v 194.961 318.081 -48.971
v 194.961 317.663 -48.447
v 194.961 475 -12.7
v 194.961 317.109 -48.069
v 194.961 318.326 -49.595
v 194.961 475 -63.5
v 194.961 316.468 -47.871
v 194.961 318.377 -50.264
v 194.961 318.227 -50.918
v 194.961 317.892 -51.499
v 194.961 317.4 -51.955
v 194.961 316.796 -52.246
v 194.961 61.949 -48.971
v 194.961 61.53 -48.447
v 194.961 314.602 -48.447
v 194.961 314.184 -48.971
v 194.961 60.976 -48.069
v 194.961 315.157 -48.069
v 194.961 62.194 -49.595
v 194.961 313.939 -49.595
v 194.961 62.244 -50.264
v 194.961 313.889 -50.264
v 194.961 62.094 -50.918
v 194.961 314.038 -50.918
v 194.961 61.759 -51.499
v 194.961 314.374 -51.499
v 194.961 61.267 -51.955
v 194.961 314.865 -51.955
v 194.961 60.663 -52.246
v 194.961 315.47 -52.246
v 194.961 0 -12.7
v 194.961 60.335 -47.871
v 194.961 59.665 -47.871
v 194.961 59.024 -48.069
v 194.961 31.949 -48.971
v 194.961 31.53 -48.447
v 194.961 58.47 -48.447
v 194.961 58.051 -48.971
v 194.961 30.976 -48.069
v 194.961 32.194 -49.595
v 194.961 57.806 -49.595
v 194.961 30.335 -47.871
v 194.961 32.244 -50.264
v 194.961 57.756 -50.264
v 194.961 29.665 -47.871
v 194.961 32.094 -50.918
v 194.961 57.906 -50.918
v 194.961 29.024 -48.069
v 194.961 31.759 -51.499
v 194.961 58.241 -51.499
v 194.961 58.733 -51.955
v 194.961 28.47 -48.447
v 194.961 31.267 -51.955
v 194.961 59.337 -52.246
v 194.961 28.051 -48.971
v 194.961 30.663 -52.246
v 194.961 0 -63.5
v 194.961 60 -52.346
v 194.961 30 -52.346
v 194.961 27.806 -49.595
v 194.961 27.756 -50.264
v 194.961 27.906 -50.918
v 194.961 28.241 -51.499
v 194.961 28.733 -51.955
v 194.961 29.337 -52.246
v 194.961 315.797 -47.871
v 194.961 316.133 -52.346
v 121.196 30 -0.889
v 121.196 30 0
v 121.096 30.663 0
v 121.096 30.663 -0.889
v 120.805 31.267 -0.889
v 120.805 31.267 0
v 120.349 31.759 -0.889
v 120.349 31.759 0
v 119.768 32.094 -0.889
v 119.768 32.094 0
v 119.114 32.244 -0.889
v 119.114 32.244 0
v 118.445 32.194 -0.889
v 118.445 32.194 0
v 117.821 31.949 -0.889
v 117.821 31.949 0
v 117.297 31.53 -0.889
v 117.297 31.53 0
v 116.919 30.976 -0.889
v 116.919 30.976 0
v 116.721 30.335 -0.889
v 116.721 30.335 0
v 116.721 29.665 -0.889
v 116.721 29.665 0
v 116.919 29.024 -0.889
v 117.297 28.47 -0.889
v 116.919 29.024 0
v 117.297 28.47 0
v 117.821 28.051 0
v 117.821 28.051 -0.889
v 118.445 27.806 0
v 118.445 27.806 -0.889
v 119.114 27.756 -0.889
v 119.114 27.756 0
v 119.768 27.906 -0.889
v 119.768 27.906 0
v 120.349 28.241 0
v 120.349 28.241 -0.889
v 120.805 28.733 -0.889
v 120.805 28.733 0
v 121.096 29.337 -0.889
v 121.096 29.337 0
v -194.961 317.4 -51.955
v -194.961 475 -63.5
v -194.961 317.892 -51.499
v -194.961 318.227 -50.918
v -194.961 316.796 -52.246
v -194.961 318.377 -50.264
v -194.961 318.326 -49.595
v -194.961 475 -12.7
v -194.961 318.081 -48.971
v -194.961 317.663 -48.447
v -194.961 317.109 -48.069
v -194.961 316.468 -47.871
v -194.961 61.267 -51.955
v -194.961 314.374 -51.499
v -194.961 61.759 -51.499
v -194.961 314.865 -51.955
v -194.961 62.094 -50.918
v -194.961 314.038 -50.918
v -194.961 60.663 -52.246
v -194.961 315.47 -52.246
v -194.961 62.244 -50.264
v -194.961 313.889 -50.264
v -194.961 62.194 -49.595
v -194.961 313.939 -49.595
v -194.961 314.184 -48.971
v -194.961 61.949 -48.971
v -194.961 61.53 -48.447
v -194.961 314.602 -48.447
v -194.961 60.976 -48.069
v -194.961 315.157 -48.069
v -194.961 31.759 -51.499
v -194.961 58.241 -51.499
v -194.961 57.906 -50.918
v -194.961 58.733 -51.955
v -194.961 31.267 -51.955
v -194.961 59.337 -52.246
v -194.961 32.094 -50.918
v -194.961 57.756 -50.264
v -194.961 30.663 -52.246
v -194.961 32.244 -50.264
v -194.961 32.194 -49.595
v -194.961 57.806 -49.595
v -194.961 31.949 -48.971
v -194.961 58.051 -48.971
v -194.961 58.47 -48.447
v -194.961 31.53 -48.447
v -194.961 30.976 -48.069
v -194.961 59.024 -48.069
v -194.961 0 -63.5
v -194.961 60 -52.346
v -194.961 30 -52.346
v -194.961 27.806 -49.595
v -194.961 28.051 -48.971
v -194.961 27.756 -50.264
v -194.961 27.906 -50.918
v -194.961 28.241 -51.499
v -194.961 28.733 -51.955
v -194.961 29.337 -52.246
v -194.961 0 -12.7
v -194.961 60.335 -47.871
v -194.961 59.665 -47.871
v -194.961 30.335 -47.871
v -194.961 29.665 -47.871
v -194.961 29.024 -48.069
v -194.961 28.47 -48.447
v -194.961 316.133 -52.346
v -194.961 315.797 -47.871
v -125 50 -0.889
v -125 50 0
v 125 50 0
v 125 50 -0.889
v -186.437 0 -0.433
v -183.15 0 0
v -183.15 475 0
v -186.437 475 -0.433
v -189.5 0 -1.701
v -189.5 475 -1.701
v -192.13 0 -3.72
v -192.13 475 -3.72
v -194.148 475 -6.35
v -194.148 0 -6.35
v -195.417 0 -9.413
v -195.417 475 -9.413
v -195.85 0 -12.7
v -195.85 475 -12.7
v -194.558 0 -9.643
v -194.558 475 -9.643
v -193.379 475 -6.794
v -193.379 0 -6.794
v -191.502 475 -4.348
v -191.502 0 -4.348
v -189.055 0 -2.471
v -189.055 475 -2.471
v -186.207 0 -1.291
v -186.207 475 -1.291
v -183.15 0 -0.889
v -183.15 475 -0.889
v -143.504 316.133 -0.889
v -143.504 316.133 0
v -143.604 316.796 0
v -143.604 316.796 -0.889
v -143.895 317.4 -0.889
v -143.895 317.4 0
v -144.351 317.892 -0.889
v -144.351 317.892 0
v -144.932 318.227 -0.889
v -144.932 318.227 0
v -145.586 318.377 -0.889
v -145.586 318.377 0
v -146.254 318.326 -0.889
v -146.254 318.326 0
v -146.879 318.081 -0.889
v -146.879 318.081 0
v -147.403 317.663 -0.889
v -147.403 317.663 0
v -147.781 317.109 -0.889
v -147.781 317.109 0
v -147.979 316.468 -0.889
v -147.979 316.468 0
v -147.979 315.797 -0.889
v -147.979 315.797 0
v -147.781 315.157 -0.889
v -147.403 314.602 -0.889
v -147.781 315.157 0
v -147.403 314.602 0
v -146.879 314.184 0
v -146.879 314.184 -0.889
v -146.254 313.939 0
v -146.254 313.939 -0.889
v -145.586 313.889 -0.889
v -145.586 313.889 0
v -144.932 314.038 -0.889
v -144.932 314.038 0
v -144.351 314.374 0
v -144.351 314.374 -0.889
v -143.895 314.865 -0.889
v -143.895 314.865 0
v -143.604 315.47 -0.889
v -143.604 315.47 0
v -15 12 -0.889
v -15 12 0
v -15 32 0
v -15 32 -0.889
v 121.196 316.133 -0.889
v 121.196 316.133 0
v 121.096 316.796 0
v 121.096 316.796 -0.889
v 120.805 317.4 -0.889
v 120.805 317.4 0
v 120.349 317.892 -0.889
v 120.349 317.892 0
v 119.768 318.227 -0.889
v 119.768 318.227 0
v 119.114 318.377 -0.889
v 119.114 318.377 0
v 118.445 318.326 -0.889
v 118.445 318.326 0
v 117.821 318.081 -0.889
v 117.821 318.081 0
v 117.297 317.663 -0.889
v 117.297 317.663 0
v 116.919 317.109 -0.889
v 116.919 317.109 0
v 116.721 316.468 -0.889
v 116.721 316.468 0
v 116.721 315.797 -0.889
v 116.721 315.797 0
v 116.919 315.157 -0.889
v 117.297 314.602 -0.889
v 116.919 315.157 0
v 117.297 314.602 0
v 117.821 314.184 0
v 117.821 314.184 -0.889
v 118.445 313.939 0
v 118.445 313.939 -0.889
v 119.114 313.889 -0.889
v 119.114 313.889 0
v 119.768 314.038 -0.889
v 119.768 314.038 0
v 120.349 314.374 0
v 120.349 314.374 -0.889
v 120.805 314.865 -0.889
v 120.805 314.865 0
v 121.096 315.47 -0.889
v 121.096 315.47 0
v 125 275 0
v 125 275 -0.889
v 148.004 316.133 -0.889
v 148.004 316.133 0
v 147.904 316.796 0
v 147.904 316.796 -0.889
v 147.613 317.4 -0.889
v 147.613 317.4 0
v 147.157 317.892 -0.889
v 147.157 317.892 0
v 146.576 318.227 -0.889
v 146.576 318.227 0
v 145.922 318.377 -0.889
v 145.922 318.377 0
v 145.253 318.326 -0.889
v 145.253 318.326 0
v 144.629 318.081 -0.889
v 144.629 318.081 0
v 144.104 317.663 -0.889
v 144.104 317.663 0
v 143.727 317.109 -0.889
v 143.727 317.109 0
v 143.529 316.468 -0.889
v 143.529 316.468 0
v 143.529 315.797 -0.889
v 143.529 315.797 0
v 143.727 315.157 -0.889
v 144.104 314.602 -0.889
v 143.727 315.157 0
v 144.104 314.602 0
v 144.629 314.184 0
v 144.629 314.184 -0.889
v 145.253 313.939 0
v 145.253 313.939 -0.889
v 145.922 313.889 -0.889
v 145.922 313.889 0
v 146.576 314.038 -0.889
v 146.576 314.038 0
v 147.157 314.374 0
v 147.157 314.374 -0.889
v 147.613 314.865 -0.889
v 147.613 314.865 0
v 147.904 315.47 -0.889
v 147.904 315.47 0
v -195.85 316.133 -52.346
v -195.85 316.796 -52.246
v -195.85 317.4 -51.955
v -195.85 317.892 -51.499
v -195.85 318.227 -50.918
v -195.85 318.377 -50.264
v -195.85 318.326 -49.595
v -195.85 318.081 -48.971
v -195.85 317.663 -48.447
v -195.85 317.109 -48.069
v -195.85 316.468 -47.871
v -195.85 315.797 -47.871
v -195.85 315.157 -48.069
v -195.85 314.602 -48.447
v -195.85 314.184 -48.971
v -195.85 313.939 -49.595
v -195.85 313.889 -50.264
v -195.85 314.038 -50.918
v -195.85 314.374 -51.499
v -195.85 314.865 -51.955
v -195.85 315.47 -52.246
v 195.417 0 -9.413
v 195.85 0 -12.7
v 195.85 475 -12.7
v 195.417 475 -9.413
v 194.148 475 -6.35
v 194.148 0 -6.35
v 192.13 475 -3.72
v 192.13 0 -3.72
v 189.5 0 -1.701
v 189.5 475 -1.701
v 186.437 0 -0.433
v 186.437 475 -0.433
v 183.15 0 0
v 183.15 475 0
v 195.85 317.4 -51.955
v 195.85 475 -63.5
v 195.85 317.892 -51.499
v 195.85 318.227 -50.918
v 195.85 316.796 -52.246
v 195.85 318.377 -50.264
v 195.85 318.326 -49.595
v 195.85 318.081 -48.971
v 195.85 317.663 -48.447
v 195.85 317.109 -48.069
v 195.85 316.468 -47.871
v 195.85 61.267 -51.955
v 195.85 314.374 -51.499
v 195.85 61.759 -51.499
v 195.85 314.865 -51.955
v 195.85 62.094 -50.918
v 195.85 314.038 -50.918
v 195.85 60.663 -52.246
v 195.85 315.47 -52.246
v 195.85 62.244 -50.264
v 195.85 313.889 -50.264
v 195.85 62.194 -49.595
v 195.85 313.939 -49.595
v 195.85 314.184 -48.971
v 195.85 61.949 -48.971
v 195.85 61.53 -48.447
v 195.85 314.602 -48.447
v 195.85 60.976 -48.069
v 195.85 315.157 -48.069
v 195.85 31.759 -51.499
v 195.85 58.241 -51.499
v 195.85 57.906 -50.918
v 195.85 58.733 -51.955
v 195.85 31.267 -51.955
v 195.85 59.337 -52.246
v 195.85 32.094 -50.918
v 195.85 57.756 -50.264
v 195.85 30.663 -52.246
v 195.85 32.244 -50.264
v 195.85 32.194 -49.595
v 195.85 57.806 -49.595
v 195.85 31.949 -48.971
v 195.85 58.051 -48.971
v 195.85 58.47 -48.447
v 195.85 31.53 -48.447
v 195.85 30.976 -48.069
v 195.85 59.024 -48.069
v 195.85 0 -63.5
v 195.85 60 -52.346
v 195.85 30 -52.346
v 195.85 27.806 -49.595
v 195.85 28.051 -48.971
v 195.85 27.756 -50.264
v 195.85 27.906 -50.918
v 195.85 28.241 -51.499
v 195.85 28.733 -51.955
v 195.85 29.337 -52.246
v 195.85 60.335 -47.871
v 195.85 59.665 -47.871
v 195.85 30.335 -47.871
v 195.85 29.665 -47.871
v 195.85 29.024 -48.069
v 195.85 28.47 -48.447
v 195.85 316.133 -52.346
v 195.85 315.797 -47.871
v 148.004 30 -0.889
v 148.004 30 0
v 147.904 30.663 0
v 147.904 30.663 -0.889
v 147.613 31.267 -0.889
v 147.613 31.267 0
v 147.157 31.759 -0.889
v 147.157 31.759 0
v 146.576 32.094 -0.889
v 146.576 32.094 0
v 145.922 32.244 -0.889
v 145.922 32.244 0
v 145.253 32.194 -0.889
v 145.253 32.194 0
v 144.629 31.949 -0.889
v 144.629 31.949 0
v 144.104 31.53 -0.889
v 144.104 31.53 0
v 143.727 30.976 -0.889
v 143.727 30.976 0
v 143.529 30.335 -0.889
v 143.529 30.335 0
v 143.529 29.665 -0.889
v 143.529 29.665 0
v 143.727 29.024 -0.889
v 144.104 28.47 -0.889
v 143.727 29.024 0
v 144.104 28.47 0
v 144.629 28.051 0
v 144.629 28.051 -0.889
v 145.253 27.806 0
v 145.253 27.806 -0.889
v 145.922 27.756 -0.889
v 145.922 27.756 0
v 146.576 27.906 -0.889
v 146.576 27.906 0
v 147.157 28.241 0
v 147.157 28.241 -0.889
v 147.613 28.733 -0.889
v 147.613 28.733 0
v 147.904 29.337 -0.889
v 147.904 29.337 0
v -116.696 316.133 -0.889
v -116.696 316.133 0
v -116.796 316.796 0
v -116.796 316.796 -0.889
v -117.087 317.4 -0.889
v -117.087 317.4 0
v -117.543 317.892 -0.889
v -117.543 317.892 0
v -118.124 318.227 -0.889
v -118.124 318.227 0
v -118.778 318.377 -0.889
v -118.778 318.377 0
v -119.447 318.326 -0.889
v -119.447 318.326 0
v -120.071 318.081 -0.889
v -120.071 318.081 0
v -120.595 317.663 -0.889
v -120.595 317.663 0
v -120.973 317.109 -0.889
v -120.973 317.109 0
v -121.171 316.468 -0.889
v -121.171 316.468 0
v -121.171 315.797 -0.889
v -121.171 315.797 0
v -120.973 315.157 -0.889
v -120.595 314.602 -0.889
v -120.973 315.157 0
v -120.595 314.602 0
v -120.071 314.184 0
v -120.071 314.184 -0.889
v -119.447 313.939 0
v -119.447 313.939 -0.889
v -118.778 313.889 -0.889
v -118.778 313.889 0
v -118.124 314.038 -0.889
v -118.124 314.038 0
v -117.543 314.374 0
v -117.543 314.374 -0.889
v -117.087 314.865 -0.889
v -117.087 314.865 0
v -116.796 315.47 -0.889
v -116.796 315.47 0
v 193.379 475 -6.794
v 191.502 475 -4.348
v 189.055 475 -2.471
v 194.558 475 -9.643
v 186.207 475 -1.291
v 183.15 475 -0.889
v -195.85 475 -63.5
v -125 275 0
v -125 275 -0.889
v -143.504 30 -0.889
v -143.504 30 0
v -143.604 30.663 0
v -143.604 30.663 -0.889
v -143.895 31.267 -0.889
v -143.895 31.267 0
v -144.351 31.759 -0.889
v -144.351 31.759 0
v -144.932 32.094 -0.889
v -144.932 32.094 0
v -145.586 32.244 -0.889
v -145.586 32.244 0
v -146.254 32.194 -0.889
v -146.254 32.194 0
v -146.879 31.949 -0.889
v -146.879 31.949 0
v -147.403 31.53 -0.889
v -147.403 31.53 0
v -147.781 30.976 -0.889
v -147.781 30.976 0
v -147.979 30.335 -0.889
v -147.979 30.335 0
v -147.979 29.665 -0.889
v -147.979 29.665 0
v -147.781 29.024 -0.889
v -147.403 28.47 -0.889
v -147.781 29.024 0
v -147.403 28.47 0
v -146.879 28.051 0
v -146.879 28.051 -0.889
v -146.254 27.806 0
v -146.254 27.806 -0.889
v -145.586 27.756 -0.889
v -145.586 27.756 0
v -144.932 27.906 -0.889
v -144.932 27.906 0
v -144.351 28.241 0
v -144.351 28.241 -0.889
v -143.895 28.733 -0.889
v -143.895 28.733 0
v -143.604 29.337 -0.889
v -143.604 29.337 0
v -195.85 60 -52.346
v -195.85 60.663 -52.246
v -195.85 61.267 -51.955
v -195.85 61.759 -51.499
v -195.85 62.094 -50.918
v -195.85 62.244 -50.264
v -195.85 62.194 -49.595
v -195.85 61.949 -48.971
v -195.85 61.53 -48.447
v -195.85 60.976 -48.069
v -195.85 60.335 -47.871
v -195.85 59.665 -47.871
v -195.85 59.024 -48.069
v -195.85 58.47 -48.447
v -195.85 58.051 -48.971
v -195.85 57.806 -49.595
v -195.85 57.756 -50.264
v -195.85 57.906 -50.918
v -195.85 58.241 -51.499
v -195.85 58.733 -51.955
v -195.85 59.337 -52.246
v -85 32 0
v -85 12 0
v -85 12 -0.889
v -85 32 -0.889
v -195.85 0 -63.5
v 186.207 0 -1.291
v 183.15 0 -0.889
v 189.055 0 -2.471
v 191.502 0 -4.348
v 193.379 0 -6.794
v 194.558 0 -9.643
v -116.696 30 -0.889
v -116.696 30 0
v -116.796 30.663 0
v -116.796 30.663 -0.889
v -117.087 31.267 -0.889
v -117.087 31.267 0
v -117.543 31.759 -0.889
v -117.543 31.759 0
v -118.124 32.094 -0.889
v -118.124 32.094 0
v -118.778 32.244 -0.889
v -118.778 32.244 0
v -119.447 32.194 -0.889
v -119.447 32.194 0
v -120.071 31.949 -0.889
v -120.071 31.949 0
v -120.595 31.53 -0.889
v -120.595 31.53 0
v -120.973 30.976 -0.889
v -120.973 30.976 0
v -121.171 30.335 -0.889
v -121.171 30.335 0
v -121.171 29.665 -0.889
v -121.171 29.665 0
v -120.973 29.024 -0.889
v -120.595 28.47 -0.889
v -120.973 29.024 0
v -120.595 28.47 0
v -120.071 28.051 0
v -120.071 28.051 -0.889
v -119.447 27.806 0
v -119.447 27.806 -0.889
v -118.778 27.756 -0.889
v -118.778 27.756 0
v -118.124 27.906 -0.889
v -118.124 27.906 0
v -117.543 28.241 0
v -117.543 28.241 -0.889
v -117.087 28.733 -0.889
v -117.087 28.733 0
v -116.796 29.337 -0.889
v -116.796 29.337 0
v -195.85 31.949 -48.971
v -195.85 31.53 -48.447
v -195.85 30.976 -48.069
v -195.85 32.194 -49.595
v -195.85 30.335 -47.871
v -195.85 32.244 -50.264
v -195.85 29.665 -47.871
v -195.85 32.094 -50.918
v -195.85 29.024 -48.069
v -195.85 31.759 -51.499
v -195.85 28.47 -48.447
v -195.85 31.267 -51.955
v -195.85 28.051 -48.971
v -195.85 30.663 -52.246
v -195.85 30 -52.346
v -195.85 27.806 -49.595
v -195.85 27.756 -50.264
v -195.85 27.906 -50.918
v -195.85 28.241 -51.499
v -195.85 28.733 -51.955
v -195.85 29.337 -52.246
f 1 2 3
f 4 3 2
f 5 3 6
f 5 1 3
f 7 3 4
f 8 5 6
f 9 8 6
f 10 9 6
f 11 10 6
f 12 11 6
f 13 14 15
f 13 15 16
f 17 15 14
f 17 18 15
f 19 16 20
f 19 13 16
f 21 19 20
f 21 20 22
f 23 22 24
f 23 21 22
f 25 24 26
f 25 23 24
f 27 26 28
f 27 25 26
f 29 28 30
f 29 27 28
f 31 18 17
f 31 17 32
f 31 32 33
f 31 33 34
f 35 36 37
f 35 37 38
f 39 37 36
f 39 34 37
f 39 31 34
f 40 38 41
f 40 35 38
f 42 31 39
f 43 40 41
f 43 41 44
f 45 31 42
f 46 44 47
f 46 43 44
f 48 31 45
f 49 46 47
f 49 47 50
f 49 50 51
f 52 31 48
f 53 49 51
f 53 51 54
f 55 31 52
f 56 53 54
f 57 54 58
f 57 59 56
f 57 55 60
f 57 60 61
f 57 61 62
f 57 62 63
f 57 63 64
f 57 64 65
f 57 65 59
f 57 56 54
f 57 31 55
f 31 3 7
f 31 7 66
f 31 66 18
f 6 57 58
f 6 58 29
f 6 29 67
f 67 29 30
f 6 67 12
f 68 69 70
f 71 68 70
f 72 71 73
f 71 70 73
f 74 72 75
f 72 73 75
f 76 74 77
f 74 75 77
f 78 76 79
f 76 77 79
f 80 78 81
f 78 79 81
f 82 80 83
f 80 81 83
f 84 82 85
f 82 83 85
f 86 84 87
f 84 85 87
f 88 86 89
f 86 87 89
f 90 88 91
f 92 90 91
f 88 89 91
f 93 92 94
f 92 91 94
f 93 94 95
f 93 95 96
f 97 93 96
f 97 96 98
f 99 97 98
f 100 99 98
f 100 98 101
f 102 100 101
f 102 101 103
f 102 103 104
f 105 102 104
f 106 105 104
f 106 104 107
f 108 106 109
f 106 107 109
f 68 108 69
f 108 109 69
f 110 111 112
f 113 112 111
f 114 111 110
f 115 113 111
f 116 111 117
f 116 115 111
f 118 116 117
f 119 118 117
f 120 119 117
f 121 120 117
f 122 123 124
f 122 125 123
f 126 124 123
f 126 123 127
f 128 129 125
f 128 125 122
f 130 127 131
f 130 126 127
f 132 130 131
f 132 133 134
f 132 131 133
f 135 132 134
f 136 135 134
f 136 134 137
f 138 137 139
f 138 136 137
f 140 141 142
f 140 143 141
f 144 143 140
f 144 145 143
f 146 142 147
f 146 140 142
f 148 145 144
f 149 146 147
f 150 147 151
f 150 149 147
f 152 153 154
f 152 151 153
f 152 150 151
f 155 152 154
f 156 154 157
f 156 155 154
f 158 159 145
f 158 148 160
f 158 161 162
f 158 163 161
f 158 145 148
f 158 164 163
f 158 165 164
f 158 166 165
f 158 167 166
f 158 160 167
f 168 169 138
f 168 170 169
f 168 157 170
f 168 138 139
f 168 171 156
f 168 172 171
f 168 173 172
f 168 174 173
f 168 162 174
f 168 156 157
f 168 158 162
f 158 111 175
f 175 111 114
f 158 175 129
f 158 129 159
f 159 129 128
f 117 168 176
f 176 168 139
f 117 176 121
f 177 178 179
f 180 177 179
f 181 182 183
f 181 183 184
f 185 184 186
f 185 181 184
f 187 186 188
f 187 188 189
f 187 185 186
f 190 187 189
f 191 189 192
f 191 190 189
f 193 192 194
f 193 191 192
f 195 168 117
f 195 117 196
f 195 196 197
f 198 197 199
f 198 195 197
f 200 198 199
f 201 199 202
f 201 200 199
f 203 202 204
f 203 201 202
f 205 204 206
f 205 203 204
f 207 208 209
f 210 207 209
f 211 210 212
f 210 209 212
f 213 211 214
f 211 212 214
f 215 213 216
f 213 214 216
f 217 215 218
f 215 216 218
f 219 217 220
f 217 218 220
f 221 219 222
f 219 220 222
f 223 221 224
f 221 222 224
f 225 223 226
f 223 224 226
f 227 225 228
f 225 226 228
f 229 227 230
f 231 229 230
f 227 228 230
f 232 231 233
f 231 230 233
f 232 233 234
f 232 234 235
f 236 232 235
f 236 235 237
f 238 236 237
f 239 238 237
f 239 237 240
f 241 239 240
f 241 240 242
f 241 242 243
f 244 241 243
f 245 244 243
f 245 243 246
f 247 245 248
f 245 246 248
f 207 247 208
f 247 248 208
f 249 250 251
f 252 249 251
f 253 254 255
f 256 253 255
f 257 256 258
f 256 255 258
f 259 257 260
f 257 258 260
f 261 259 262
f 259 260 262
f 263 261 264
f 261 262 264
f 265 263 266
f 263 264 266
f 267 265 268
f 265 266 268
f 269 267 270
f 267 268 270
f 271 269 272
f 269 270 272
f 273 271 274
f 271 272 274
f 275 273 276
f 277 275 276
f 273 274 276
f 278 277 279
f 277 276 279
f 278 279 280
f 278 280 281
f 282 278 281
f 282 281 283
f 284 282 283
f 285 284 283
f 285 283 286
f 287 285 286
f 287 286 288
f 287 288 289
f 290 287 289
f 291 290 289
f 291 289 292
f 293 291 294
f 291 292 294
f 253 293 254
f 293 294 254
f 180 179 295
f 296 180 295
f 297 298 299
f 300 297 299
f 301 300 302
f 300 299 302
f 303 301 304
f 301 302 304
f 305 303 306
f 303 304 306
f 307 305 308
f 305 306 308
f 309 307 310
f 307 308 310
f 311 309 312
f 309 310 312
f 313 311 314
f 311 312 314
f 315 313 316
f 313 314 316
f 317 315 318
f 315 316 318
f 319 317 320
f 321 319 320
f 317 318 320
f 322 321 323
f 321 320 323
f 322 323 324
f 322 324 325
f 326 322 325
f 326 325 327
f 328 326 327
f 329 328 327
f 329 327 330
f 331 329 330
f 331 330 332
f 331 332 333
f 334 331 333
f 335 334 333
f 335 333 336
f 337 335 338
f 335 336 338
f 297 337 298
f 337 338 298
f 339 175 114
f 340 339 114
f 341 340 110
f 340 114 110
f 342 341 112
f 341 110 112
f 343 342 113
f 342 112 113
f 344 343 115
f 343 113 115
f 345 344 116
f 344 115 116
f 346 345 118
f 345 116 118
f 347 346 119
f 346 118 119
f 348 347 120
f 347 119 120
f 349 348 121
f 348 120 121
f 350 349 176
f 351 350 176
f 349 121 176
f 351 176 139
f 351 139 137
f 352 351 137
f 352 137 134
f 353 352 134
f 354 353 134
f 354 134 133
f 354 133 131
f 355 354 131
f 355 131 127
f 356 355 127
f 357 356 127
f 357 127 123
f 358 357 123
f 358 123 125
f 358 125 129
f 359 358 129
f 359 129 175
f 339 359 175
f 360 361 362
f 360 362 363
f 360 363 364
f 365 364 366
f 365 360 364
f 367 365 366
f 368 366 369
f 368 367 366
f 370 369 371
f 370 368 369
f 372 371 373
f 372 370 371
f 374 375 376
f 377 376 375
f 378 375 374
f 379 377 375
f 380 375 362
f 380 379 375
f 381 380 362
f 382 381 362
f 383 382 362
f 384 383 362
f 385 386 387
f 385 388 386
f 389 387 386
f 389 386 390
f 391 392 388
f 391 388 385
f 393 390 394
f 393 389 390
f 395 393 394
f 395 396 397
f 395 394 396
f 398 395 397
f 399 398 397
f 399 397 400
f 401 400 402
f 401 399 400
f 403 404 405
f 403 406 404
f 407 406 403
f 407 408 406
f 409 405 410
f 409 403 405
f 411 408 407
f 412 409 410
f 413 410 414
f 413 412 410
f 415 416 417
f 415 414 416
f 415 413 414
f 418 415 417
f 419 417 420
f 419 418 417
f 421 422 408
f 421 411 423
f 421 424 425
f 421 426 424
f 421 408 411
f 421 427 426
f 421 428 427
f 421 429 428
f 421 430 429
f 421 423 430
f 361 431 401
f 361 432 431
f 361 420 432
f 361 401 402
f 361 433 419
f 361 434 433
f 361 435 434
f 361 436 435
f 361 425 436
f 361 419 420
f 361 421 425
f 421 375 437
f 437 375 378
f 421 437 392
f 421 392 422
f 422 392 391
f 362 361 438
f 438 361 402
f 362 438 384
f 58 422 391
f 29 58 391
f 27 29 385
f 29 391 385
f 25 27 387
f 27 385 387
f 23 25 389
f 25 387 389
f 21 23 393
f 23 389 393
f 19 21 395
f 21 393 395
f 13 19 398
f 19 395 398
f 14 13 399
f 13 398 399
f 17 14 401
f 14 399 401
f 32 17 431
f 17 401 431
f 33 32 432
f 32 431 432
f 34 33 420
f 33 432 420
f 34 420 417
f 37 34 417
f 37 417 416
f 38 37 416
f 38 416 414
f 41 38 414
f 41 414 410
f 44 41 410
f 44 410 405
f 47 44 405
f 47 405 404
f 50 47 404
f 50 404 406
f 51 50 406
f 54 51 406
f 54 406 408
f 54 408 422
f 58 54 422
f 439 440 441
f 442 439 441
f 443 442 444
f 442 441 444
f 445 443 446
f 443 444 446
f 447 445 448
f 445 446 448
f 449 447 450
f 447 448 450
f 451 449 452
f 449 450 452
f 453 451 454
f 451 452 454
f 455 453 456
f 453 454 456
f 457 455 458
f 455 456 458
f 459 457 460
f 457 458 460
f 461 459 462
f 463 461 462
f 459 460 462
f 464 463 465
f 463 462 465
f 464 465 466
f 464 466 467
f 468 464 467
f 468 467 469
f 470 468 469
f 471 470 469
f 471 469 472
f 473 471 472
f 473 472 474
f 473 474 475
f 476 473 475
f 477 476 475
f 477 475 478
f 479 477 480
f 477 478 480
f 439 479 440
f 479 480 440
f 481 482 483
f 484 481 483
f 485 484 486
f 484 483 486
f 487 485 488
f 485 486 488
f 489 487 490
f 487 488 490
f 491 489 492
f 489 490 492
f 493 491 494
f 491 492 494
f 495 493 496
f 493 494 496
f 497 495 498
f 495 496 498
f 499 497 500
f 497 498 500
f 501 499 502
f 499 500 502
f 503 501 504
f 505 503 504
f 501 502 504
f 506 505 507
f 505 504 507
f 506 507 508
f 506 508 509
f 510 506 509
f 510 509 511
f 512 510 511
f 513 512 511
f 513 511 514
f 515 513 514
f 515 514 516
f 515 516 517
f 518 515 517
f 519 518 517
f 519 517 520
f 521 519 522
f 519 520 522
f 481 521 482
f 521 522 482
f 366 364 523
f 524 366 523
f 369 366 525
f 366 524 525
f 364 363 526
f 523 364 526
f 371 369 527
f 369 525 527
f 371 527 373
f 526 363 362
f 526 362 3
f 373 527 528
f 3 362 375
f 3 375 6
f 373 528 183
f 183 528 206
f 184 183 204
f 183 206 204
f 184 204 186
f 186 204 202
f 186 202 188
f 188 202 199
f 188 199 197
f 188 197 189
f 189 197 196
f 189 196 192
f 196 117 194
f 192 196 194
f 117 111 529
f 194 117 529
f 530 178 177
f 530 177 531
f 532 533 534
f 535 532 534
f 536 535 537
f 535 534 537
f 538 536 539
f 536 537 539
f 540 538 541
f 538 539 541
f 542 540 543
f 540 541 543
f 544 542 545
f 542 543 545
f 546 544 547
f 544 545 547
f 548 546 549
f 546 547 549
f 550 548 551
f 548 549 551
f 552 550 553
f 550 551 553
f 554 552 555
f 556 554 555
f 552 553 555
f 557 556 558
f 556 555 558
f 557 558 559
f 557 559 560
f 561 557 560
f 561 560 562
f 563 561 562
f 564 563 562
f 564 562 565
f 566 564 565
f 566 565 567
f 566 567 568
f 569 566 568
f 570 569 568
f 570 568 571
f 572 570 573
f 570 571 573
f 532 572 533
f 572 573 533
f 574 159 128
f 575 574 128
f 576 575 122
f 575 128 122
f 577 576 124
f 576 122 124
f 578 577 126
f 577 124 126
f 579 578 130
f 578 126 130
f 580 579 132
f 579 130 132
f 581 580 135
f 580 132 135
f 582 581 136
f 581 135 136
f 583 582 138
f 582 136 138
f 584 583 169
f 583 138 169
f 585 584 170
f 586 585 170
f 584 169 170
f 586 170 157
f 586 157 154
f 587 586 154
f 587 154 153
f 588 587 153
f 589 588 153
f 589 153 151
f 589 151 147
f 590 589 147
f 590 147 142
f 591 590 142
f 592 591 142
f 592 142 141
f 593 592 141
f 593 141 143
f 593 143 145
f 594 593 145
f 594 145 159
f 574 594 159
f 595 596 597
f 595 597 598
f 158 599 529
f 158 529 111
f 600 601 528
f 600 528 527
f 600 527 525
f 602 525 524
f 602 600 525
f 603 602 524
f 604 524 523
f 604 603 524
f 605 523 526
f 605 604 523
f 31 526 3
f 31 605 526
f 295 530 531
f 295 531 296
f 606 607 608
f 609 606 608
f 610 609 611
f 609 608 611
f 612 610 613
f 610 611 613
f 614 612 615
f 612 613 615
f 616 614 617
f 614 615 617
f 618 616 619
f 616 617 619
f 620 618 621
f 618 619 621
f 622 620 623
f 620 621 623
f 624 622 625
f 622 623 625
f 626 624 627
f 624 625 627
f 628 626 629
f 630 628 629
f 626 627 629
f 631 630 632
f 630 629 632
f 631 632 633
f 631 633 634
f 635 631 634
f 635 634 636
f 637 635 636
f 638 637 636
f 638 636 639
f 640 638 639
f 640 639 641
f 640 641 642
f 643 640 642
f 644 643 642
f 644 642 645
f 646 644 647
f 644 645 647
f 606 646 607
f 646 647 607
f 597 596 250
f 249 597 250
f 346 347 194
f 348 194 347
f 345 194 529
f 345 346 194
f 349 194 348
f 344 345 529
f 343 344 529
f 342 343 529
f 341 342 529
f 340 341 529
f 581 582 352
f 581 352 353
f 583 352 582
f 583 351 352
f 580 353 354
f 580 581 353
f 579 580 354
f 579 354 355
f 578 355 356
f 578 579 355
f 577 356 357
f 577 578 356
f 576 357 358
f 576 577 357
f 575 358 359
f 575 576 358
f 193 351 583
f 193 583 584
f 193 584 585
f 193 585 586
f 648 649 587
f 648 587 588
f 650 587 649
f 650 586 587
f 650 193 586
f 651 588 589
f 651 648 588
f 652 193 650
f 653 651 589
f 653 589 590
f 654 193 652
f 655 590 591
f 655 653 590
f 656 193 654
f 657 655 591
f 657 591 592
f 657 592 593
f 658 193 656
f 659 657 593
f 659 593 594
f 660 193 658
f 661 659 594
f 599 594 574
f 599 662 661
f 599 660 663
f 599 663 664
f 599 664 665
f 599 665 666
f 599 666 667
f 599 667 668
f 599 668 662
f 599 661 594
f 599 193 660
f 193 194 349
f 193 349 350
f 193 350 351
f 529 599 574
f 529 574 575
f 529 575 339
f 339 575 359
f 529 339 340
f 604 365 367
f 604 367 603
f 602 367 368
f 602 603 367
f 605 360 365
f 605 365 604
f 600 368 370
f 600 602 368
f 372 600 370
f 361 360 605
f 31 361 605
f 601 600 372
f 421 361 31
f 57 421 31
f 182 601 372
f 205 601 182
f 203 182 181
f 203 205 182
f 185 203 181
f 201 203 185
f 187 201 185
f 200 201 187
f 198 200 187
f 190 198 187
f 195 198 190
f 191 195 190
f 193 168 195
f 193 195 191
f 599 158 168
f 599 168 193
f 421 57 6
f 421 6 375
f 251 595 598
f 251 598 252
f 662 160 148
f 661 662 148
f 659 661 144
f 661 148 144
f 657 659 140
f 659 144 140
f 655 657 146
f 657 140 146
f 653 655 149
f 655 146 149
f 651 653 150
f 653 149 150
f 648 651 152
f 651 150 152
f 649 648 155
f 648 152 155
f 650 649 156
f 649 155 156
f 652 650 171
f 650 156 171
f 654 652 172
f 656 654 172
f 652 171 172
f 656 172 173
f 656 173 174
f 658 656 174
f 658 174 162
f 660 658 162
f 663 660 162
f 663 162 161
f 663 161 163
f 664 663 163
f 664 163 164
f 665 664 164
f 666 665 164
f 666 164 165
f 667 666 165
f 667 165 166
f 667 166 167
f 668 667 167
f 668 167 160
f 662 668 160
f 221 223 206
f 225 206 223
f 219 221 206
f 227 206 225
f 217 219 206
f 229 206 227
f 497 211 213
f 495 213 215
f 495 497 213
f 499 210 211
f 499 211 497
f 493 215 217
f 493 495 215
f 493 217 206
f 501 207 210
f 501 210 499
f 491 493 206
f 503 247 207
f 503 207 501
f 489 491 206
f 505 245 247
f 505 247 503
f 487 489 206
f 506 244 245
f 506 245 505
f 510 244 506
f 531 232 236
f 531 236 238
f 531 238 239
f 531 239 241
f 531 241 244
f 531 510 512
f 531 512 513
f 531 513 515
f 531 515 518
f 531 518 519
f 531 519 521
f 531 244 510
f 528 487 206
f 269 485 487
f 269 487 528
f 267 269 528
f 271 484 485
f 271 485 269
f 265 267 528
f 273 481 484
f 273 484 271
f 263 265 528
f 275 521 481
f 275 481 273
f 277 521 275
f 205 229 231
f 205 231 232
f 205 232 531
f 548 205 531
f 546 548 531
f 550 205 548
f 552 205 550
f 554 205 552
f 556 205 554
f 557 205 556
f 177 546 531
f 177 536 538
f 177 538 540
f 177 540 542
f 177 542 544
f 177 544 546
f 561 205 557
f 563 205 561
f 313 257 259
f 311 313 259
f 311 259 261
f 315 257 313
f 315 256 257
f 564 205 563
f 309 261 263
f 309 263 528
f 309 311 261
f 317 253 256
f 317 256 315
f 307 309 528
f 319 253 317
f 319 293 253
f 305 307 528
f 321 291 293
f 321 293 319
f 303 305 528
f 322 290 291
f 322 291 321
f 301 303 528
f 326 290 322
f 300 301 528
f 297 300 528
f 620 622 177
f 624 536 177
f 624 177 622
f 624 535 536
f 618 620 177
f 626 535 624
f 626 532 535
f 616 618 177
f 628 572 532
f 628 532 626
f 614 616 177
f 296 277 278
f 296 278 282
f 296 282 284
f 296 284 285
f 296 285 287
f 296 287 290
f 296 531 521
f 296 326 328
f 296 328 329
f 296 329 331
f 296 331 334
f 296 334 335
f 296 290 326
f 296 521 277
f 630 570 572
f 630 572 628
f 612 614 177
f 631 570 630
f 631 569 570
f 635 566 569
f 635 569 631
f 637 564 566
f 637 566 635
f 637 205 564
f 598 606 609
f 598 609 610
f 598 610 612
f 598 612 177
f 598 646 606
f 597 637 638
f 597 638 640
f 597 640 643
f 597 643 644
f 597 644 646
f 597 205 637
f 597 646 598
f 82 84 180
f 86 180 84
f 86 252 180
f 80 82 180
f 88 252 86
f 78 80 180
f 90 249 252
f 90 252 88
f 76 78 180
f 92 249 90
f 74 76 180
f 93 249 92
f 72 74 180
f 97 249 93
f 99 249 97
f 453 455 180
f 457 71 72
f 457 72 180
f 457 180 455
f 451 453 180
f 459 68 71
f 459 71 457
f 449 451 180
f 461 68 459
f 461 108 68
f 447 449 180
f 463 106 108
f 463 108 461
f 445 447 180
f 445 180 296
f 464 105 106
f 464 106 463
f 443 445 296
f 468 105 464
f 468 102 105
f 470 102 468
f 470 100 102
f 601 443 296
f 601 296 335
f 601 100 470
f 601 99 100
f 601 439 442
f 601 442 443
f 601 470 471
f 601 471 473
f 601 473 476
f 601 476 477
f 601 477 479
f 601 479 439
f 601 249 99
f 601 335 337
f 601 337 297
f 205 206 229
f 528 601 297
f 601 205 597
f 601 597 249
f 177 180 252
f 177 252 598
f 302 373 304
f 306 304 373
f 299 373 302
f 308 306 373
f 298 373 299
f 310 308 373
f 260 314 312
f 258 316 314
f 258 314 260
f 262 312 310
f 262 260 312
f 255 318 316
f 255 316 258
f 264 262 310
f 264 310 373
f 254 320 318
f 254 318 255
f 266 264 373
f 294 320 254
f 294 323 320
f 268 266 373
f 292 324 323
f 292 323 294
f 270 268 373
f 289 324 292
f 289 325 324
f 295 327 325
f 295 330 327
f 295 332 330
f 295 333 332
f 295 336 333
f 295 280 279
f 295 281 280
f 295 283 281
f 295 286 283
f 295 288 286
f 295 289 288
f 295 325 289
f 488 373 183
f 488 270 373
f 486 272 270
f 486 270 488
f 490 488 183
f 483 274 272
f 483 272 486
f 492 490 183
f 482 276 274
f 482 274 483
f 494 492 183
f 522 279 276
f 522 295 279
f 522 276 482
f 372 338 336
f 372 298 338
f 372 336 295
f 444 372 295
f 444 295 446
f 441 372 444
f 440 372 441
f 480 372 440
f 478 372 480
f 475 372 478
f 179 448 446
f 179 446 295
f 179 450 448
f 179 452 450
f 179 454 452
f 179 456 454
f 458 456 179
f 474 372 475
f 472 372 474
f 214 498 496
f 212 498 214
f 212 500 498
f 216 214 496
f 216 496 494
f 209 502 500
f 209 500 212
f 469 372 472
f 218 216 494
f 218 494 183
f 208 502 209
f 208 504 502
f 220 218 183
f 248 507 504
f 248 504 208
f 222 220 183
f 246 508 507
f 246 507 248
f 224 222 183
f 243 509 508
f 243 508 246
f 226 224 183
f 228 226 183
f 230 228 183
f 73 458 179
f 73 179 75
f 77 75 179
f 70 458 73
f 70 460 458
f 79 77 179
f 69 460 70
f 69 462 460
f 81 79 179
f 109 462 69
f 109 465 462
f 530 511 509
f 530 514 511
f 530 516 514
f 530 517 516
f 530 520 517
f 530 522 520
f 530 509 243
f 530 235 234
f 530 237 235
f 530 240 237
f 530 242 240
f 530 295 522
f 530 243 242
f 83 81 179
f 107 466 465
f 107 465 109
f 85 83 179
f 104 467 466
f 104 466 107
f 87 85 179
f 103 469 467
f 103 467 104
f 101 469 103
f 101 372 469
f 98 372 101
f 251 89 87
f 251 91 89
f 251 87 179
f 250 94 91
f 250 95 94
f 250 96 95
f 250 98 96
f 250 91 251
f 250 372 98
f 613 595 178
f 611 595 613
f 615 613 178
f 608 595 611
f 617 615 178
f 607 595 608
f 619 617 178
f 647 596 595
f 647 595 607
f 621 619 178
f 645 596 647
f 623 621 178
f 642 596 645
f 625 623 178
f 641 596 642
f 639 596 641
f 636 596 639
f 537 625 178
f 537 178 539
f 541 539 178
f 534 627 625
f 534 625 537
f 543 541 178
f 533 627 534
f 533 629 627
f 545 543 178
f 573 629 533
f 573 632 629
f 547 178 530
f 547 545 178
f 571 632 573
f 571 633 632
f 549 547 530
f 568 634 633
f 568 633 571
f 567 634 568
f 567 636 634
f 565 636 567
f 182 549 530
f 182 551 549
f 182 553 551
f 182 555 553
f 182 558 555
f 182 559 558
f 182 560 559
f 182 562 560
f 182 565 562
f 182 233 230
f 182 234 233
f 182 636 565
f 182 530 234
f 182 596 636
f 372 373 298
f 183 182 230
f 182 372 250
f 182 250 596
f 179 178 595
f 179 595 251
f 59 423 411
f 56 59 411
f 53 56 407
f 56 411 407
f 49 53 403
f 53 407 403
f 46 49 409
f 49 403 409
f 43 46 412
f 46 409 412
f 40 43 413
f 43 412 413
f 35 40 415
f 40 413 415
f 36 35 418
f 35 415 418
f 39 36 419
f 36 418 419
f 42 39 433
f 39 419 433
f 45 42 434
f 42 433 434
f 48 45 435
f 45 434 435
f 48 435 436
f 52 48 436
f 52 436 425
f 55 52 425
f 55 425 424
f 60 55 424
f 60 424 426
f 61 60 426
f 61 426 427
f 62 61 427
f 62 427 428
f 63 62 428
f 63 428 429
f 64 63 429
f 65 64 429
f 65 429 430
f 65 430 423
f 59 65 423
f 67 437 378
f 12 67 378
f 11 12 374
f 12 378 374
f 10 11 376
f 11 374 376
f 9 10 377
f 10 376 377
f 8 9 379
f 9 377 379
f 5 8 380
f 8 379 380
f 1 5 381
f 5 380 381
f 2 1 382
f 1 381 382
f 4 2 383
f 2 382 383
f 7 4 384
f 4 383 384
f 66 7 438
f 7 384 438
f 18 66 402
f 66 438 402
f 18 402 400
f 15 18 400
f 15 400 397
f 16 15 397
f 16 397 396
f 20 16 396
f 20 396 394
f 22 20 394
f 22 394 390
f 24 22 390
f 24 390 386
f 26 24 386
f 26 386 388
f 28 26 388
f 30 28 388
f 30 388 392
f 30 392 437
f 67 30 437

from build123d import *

# Parameters (mm, degrees)
BASE_FLANGE2_DEPTH = 475
SKETCH6_W          = 250
SKETCH6_H          = 225
CUT_EXTRUDE2_DEPTH = 2.54
SKETCH13_R         = 2.25
CUT_EXTRUDE4_DEPTH = 619.939427238
SKETCH14_R         = 2.25
CUT_EXTRUDE5_DEPTH = 0.889
SKETCH15_W         = 70
SKETCH15_H         = 20
CUT_EXTRUDE6_DEPTH = 0.889


# Sheet-metal steps are written as plain solids
with BuildPart() as part:
    # Sketch1 → Base-Flange2 (new body)
    with BuildSketch(Plane(origin=(0, 0, 0), x_dir=(1, 0, 0), z_dir=(0, 1, 0))):
        with BuildLine():
            Line((195.849919958, 63.5), (195.849919958, 12.7))
            ThreePointArc((195.849919958, 12.7), (192.130176079, 3.719743879), (183.149919958, 0))
            Line((183.149919958, 0), (-183.149919958, 0))
            ThreePointArc((-183.149919958, 0), (-192.130176079, 3.719743879), (-195.849919958, 12.7))
            Line((-195.849919958, 12.7), (-195.849919958, 63.5))
            Line((-195.849919958, 63.5), (-194.960919958, 63.5))
            Line((-194.960919958, 63.5), (-194.960919958, 12.7))
            ThreePointArc((-194.960919958, 12.7), (-191.501558151, 4.348361807), (-183.149919958, 0.889))
            Line((-183.149919958, 0.889), (183.149919958, 0.889))
            ThreePointArc((183.149919958, 0.889), (191.501558151, 4.348361807), (194.960919958, 12.7))
            Line((194.960919958, 12.7), (194.960919958, 63.5))
            Line((194.960919958, 63.5), (195.849919958, 63.5))
        make_face()
    extrude(amount=BASE_FLANGE2_DEPTH)

    # Sketch6 → Cut-Extrude2 (cut)
    with BuildSketch(Plane.XY):
        with Locations((0, 162.5)):
            Rectangle(SKETCH6_W, SKETCH6_H)
    extrude(amount=-CUT_EXTRUDE2_DEPTH, mode=Mode.SUBTRACT)

    # Sketch13 → Cut-Extrude4 (cut, through all)
    with BuildSketch(Plane(origin=(195.849919958, 0, 0), x_dir=(0, 0, -1), z_dir=(1, 0, 0))):
        with Locations((50.096107, 60)):
            Circle(SKETCH13_R)
        with Locations((50.096107, 316.132840032)):
            Circle(SKETCH13_R)
        with Locations((50.096107, 30)):
            Circle(SKETCH13_R)
    extrude(amount=-CUT_EXTRUDE4_DEPTH, mode=Mode.SUBTRACT)

    # Sketch14 → Cut-Extrude5 (cut)
    with BuildSketch(Plane.XY):
        with Locations((-145.753813013, 316.132839976)):
            Circle(SKETCH14_R)
        with Locations((-118.946026903, 316.132839976)):
            Circle(SKETCH14_R)
        with Locations((118.946026903, 316.132839976)):
            Circle(SKETCH14_R)
        with Locations((145.753813013, 316.132839976)):
            Circle(SKETCH14_R)
        with Locations((145.753813013, 30)):
            Circle(SKETCH14_R)
        with Locations((118.946026903, 30)):
            Circle(SKETCH14_R)
        with Locations((-118.946026903, 30)):
            Circle(SKETCH14_R)
        with Locations((-145.753813013, 30)):
            Circle(SKETCH14_R)
    extrude(amount=-CUT_EXTRUDE5_DEPTH, mode=Mode.SUBTRACT)

    # Sketch15 → Cut-Extrude6 (cut)
    with BuildSketch(Plane.XY):
        with Locations((-50, 22)):
            Rectangle(SKETCH15_W, SKETCH15_H)
    extrude(amount=-CUT_EXTRUDE6_DEPTH, mode=Mode.SUBTRACT)


solid = part.part
